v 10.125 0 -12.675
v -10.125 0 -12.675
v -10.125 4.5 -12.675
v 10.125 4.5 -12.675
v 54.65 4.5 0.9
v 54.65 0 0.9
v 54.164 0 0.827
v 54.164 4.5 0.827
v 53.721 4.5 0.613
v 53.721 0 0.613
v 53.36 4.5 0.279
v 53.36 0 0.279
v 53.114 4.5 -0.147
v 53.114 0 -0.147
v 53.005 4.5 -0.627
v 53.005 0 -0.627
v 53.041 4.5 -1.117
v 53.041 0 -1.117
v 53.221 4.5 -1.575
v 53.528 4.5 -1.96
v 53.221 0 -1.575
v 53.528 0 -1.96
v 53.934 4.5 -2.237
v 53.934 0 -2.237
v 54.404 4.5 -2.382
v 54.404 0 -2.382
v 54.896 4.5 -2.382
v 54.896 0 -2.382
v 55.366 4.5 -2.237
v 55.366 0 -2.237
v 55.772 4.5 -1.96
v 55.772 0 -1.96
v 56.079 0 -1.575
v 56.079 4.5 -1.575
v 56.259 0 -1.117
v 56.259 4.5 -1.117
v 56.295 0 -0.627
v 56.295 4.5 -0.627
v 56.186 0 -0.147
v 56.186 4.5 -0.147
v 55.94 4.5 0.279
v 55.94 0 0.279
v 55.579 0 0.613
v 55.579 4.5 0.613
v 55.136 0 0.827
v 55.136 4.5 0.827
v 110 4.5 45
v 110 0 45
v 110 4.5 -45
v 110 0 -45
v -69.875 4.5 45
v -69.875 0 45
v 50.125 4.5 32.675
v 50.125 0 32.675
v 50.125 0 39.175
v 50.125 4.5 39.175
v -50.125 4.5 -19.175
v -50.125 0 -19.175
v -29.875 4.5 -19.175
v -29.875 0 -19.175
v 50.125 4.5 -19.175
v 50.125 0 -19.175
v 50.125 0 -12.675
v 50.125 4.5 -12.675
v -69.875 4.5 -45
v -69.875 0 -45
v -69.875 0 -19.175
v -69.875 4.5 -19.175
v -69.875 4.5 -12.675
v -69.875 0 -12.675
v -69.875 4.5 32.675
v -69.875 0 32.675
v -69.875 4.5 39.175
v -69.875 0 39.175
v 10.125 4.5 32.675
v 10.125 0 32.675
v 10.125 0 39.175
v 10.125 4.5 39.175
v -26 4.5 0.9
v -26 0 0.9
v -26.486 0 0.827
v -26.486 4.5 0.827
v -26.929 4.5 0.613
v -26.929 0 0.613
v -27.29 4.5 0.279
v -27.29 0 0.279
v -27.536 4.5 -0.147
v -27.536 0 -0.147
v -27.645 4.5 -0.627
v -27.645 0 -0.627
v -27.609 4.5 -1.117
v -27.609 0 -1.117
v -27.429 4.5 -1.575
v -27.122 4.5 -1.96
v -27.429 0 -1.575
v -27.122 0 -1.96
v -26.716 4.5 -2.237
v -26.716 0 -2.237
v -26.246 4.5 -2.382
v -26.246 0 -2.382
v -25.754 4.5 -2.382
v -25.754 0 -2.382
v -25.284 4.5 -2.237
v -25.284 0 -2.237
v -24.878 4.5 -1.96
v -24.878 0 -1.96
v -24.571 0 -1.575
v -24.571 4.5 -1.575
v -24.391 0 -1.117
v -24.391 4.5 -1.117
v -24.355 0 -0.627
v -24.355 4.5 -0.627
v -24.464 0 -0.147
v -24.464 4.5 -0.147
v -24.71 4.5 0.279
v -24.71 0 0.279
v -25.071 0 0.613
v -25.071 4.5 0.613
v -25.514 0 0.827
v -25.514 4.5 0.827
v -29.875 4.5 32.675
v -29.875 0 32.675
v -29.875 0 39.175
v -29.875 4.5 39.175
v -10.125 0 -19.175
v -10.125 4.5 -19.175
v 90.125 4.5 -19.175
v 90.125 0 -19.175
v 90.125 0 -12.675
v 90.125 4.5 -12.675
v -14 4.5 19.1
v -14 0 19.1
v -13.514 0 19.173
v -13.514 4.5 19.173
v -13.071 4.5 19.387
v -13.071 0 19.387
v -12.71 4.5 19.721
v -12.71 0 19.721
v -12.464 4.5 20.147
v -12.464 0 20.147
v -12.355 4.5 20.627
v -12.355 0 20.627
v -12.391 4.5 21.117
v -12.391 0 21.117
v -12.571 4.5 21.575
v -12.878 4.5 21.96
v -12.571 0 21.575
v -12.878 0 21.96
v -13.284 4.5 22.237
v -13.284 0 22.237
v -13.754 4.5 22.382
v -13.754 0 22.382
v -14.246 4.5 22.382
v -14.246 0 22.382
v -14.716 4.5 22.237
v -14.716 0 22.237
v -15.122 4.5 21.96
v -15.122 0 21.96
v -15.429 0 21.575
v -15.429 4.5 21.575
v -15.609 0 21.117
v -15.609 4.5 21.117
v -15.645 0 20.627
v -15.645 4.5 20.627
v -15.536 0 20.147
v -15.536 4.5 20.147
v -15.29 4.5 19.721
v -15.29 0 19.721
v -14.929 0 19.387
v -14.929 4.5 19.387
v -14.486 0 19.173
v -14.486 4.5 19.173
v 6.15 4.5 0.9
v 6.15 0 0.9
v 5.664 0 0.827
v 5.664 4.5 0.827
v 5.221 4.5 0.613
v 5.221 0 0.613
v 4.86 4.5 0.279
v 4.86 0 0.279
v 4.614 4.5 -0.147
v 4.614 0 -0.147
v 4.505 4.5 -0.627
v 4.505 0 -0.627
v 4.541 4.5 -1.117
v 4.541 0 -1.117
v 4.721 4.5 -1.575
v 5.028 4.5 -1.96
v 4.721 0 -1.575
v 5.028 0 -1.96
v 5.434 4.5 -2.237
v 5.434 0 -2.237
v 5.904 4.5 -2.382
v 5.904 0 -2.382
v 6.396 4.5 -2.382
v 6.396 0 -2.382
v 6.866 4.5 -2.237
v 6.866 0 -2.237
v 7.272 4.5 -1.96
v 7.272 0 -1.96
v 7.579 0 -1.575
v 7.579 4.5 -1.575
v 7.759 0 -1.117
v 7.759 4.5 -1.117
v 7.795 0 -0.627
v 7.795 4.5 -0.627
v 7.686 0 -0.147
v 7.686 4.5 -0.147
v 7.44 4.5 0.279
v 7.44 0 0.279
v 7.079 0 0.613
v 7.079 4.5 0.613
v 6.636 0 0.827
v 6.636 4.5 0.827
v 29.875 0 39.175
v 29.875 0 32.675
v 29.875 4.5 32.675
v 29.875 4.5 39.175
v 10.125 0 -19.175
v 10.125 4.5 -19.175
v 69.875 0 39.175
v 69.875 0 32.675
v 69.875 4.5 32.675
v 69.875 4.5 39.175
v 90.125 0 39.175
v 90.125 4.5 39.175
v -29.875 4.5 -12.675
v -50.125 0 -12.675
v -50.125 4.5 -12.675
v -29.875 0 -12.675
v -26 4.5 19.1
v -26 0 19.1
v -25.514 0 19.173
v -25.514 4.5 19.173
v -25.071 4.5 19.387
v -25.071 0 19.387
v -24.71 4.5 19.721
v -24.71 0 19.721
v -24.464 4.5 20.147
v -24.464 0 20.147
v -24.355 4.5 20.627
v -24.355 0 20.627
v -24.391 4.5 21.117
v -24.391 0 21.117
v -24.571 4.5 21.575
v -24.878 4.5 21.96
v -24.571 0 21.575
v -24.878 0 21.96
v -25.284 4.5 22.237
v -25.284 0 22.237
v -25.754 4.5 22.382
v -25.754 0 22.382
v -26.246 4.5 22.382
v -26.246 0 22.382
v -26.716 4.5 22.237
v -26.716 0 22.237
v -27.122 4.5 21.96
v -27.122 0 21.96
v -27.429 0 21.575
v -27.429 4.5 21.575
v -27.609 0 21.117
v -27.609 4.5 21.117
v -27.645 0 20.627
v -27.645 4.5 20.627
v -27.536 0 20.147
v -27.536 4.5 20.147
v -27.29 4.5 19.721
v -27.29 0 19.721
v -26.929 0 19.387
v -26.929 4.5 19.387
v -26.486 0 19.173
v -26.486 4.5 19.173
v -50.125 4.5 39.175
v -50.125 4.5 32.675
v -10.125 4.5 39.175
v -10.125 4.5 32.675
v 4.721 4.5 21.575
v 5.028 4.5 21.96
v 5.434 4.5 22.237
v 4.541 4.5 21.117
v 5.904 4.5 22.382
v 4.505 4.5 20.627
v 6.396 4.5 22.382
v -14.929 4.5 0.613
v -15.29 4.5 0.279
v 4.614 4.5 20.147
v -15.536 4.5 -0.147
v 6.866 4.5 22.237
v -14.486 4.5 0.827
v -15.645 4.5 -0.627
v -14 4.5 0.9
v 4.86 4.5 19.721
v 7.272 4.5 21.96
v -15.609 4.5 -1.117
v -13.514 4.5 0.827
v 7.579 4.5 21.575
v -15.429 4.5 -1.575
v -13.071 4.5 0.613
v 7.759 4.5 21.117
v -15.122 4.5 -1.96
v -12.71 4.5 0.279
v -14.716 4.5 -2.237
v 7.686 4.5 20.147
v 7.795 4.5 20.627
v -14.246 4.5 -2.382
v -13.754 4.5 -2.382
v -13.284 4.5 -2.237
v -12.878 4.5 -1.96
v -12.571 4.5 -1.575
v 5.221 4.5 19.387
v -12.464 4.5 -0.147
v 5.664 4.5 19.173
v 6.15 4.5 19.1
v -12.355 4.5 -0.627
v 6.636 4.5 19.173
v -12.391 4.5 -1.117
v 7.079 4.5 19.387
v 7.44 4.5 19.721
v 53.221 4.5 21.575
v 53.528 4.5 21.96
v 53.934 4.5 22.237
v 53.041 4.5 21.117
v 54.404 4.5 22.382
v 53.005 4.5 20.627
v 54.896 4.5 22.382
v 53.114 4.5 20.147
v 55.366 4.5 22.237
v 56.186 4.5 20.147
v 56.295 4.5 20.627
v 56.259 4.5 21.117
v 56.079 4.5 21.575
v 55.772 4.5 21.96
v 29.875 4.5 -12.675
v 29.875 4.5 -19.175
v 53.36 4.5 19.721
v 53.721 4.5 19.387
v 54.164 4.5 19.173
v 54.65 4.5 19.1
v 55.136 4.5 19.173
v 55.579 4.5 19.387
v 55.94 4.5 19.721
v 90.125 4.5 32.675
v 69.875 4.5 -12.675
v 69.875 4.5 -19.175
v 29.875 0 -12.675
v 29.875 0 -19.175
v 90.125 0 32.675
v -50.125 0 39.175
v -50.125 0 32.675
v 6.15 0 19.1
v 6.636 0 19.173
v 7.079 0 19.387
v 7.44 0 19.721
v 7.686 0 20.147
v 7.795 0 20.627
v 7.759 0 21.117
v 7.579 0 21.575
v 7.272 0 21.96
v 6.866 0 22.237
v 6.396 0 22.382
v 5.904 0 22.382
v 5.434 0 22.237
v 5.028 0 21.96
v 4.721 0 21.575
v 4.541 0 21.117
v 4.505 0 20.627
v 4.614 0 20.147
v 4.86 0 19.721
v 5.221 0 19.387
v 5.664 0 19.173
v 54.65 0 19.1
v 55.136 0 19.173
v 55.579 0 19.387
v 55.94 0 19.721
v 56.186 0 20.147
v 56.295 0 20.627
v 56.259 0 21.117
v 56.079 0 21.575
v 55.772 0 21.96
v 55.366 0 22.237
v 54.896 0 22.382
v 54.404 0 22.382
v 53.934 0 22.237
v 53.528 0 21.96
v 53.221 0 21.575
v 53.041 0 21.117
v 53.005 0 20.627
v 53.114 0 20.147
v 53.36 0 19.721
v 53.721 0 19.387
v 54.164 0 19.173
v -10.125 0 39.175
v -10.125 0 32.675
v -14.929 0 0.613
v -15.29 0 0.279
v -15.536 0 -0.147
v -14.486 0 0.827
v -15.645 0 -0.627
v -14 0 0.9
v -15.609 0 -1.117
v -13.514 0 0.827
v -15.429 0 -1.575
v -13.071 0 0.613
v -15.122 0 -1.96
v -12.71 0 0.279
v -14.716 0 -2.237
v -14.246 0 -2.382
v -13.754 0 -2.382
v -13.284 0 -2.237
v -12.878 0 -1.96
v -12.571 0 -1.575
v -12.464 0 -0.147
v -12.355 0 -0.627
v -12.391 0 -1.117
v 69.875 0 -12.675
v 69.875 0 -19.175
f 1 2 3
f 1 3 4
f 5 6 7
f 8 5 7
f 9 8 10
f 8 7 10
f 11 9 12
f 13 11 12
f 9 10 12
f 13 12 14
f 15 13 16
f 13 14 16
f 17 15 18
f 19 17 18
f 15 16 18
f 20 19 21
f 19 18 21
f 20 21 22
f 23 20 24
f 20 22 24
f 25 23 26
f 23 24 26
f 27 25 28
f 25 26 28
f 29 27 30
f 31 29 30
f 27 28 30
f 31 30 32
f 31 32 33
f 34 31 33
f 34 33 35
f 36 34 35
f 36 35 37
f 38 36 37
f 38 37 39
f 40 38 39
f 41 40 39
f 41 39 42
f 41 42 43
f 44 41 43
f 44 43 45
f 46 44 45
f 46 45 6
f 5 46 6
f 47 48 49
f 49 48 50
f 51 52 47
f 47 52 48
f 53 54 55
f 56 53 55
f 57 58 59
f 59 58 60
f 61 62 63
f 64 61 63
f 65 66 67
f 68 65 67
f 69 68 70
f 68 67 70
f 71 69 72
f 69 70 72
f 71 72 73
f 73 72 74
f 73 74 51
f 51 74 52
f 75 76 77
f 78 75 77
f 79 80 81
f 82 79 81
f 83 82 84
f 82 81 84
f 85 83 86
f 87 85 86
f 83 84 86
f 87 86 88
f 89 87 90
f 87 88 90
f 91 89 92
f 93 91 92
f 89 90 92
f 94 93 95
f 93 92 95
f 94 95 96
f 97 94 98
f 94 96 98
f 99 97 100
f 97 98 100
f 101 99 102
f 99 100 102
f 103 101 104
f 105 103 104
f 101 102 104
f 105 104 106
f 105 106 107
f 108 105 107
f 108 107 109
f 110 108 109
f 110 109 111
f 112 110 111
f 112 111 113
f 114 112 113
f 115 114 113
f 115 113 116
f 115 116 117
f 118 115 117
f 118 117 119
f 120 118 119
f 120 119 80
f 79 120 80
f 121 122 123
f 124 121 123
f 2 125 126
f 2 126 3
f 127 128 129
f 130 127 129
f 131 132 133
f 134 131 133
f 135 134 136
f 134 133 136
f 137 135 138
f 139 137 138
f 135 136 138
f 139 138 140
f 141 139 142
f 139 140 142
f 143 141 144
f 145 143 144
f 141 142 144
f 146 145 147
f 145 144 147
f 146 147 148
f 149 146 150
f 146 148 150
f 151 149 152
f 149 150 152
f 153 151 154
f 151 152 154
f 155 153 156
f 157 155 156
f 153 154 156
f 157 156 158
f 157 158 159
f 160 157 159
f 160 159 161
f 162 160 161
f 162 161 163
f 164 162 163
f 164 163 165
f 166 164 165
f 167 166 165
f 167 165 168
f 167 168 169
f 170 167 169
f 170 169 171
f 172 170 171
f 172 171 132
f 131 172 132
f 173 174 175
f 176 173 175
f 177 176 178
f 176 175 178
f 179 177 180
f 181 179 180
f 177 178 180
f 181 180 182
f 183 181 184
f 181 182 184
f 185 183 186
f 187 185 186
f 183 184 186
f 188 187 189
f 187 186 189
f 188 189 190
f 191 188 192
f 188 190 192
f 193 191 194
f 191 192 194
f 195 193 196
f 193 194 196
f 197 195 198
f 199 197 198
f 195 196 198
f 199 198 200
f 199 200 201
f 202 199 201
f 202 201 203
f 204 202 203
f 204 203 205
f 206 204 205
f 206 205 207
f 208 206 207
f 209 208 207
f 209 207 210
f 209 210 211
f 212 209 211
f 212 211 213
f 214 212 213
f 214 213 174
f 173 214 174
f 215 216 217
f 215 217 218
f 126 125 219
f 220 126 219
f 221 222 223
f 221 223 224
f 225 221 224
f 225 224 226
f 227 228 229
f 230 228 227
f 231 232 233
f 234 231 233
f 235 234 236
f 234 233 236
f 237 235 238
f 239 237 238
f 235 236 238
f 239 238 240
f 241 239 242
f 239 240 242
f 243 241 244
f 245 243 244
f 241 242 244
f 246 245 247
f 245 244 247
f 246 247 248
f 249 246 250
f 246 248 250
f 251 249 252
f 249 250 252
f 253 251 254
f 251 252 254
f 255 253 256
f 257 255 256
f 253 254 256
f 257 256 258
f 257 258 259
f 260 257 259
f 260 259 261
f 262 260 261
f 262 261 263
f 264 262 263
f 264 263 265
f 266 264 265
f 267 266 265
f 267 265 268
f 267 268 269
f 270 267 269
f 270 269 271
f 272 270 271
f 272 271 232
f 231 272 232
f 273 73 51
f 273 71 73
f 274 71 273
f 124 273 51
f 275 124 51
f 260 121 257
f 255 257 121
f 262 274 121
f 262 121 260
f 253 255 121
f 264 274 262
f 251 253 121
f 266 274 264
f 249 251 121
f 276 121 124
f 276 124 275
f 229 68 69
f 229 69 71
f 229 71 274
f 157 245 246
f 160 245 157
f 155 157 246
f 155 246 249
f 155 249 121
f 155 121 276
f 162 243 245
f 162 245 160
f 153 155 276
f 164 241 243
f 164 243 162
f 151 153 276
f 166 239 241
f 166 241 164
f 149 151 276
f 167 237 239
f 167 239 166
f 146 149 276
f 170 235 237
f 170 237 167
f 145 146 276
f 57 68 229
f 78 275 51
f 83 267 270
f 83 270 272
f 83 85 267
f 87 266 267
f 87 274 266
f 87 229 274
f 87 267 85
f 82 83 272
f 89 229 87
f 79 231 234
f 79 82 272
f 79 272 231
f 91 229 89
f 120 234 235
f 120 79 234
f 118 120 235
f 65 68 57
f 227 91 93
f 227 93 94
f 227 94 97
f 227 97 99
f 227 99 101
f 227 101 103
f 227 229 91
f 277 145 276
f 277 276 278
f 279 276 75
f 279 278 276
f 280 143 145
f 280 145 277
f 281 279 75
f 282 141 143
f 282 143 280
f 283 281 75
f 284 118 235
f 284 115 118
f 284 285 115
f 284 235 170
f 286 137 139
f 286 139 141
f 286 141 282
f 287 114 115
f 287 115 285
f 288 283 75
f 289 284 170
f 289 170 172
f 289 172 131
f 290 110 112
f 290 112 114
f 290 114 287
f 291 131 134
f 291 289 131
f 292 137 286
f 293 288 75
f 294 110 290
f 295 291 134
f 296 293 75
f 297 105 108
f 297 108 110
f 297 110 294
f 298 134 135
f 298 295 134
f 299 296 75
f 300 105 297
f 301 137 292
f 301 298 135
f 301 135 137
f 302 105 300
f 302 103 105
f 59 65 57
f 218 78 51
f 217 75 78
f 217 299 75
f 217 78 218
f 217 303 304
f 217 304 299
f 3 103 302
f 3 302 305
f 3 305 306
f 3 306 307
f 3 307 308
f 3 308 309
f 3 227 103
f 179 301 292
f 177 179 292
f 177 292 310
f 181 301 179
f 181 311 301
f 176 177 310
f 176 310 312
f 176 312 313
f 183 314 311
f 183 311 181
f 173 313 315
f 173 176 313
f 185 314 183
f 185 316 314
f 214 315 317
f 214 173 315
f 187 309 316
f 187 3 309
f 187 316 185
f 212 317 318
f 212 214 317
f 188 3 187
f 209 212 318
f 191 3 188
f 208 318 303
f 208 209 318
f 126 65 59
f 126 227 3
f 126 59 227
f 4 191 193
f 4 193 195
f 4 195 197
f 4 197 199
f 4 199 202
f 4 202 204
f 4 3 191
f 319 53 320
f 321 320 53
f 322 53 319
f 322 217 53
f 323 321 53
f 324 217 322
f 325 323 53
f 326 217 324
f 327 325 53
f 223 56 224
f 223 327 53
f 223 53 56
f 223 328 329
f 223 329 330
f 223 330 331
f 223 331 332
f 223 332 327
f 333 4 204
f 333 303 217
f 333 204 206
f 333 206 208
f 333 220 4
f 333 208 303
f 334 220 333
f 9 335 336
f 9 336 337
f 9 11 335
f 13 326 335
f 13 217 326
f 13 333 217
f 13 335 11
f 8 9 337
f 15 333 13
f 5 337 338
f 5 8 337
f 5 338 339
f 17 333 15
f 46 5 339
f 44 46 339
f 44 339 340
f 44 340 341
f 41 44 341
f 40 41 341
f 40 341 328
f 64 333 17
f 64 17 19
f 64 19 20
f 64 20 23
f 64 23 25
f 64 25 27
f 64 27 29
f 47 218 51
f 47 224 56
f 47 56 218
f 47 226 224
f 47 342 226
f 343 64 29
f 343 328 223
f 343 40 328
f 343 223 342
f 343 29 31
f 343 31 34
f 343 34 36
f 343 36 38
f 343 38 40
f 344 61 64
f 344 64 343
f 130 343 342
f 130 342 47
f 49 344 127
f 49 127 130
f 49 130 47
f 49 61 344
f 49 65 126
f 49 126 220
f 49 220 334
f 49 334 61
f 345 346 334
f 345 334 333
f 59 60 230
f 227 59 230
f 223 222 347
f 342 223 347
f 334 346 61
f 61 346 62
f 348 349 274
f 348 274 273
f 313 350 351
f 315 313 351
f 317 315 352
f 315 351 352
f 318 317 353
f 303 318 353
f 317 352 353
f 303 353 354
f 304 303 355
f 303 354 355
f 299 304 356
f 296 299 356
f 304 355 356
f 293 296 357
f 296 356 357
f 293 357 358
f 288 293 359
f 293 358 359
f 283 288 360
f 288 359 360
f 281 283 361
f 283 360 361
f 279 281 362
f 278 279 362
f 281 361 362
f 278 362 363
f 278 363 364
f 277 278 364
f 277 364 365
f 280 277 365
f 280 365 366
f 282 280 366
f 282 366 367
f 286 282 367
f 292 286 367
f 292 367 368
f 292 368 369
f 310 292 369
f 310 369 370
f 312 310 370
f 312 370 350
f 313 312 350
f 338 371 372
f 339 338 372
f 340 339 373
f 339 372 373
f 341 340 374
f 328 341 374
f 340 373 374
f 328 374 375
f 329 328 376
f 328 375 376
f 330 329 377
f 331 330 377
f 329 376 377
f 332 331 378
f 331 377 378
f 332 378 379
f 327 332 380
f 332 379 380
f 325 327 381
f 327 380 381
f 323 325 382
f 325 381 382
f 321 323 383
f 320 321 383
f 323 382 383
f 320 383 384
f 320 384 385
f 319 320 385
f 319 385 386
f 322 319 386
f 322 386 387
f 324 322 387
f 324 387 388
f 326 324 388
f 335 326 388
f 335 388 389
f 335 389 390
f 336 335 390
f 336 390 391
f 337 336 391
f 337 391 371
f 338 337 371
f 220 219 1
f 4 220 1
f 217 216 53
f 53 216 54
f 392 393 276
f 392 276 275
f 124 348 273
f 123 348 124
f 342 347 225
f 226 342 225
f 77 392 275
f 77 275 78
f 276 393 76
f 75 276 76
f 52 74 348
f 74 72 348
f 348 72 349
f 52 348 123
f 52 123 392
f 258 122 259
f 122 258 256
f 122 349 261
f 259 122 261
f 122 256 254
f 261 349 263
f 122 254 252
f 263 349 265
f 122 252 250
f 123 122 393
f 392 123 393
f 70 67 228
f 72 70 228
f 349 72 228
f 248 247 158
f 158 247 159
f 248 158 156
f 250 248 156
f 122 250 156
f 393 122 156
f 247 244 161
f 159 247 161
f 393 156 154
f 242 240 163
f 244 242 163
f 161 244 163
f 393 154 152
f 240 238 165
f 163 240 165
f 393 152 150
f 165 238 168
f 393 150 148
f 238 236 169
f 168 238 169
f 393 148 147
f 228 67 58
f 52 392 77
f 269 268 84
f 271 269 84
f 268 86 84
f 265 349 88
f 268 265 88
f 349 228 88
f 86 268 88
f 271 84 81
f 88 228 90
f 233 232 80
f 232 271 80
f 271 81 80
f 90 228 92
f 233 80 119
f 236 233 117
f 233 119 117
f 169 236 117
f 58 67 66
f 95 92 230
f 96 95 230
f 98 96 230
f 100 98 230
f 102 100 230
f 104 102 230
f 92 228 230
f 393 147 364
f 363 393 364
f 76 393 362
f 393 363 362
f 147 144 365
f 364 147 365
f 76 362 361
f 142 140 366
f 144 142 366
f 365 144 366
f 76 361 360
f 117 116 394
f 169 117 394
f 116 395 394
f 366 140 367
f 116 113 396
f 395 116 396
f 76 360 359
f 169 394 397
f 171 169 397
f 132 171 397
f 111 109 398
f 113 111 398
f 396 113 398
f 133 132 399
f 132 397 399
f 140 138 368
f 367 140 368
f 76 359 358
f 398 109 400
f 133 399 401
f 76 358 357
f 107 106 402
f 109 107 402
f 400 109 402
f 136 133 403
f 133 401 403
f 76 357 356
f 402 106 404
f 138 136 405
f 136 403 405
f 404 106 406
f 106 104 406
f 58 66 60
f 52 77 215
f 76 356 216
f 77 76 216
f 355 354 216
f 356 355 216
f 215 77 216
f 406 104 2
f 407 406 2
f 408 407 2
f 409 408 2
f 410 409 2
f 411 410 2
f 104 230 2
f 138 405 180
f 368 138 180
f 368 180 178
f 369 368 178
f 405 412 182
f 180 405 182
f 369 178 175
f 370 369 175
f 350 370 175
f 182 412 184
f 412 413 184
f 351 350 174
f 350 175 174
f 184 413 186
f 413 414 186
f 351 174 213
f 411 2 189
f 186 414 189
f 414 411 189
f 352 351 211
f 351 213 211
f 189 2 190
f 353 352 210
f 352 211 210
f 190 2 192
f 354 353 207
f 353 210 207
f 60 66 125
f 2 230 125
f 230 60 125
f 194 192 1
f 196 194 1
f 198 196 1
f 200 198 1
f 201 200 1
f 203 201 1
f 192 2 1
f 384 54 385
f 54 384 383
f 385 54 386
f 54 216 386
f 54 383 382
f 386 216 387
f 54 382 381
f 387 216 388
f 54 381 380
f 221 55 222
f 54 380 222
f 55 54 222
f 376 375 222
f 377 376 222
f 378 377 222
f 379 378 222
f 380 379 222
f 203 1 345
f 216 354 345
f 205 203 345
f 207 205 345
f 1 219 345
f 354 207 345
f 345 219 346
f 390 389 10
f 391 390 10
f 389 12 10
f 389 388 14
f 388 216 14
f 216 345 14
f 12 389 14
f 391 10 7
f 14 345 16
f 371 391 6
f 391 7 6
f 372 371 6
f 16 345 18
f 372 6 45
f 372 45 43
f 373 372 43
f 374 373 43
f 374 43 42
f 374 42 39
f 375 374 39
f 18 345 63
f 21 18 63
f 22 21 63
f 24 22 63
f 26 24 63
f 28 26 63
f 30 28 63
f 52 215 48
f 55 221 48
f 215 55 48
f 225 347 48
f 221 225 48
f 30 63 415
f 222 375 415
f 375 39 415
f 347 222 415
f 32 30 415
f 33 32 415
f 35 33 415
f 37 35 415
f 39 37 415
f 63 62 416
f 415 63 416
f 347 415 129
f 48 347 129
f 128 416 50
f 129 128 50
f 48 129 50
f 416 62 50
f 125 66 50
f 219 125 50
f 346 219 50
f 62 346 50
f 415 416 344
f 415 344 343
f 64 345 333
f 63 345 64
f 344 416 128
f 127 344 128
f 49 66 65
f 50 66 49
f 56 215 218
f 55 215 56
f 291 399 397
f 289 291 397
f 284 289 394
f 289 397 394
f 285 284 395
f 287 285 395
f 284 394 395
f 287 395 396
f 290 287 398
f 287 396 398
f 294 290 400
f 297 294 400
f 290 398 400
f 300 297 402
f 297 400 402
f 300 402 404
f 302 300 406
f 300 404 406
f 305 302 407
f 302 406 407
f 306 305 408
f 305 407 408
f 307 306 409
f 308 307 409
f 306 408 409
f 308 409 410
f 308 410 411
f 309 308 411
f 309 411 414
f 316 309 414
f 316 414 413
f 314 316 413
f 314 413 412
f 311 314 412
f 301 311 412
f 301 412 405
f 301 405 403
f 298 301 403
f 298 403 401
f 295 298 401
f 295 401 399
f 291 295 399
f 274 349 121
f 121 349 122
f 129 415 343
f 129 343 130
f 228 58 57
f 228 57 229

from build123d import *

# Parameters (mm, degrees)
SKETCH2_W           = 220
SKETCH2_H           = 90
BOSS_EXTRUDE1_DEPTH = 4.5
SKETCH3_W           = 20.25
SKETCH3_H           = 6.5
CUT_EXTRUDE1_DEPTH  = 119.933805119
SKETCH5_R           = 1.65
BRACKET_HOLES_DEPTH = 119.933805119
SKETCH6_W           = 59.428711229
SKETCH6_H           = 112.188854202
TRIM_CUT_DEPTH      = 119.933805119


with BuildPart() as part:
    # Sketch2 → Boss-Extrude1 (new body)
    with BuildSketch(Plane(origin=(0, 0, 0), x_dir=(1, 0, 0), z_dir=(0, 1, 0))):
        Rectangle(SKETCH2_W, SKETCH2_H)
    extrude(amount=BOSS_EXTRUDE1_DEPTH)

    # Sketch3 → Cut-Extrude1 (cut, through all)
    with BuildSketch(Plane.XZ):
        with Locations((40, -15.925)):
            Rectangle(SKETCH3_W, SKETCH3_H)
        with Locations((0, -15.925)):
            Rectangle(SKETCH3_W, SKETCH3_H)
        with Locations((80, -15.925)):
            Rectangle(SKETCH3_W, SKETCH3_H)
        with Locations((-80, -15.925)):
            Rectangle(SKETCH3_W, SKETCH3_H)
        with Locations((-40, -15.925)):
            Rectangle(SKETCH3_W, SKETCH3_H)
        with Locations((-40, 35.925)):
            Rectangle(SKETCH3_W, SKETCH3_H)
        with Locations((-80, 35.925)):
            Rectangle(SKETCH3_W, SKETCH3_H)
        with Locations((80, 35.925)):
            Rectangle(SKETCH3_W, SKETCH3_H)
        with Locations((40, 35.925)):
            Rectangle(SKETCH3_W, SKETCH3_H)
        with Locations((0, 35.925)):
            Rectangle(SKETCH3_W, SKETCH3_H)
    extrude(amount=-CUT_EXTRUDE1_DEPTH, mode=Mode.SUBTRACT)

    # Sketch5 → Bracket holes (cut, through all)
    with BuildSketch(Plane.XZ):
        with Locations(Location((-26, 20.75, 0), (0, 0, 270))):
            Circle(SKETCH5_R)
        with Locations(Location((-14, 20.75, 0), (0, 0, 270))):
            Circle(SKETCH5_R)
        with Locations(Location((6.15, 20.75, 0), (0, 0, 270))):
            Circle(SKETCH5_R)
        with Locations(Location((54.65, 20.75, 0), (0, 0, 270))):
            Circle(SKETCH5_R)
        with Locations(Location((54.65, -0.75, 0), (0, 0, 90))):
            Circle(SKETCH5_R)
        with Locations(Location((6.15, -0.75, 0), (0, 0, 90))):
            Circle(SKETCH5_R)
        with Locations(Location((-14, -0.75, 0), (0, 0, 90))):
            Circle(SKETCH5_R)
        with Locations(Location((-26, -0.75, 0), (0, 0, 90))):
            Circle(SKETCH5_R)
    extrude(amount=-BRACKET_HOLES_DEPTH, mode=Mode.SUBTRACT)

    # Sketch6 → Trim cut (cut, through all)
    with BuildSketch(Plane.XZ):
        with Locations((-99.589355615, -2.07728242)):
            Rectangle(SKETCH6_W, SKETCH6_H)
    extrude(amount=-TRIM_CUT_DEPTH, mode=Mode.SUBTRACT)


solid = part.part
